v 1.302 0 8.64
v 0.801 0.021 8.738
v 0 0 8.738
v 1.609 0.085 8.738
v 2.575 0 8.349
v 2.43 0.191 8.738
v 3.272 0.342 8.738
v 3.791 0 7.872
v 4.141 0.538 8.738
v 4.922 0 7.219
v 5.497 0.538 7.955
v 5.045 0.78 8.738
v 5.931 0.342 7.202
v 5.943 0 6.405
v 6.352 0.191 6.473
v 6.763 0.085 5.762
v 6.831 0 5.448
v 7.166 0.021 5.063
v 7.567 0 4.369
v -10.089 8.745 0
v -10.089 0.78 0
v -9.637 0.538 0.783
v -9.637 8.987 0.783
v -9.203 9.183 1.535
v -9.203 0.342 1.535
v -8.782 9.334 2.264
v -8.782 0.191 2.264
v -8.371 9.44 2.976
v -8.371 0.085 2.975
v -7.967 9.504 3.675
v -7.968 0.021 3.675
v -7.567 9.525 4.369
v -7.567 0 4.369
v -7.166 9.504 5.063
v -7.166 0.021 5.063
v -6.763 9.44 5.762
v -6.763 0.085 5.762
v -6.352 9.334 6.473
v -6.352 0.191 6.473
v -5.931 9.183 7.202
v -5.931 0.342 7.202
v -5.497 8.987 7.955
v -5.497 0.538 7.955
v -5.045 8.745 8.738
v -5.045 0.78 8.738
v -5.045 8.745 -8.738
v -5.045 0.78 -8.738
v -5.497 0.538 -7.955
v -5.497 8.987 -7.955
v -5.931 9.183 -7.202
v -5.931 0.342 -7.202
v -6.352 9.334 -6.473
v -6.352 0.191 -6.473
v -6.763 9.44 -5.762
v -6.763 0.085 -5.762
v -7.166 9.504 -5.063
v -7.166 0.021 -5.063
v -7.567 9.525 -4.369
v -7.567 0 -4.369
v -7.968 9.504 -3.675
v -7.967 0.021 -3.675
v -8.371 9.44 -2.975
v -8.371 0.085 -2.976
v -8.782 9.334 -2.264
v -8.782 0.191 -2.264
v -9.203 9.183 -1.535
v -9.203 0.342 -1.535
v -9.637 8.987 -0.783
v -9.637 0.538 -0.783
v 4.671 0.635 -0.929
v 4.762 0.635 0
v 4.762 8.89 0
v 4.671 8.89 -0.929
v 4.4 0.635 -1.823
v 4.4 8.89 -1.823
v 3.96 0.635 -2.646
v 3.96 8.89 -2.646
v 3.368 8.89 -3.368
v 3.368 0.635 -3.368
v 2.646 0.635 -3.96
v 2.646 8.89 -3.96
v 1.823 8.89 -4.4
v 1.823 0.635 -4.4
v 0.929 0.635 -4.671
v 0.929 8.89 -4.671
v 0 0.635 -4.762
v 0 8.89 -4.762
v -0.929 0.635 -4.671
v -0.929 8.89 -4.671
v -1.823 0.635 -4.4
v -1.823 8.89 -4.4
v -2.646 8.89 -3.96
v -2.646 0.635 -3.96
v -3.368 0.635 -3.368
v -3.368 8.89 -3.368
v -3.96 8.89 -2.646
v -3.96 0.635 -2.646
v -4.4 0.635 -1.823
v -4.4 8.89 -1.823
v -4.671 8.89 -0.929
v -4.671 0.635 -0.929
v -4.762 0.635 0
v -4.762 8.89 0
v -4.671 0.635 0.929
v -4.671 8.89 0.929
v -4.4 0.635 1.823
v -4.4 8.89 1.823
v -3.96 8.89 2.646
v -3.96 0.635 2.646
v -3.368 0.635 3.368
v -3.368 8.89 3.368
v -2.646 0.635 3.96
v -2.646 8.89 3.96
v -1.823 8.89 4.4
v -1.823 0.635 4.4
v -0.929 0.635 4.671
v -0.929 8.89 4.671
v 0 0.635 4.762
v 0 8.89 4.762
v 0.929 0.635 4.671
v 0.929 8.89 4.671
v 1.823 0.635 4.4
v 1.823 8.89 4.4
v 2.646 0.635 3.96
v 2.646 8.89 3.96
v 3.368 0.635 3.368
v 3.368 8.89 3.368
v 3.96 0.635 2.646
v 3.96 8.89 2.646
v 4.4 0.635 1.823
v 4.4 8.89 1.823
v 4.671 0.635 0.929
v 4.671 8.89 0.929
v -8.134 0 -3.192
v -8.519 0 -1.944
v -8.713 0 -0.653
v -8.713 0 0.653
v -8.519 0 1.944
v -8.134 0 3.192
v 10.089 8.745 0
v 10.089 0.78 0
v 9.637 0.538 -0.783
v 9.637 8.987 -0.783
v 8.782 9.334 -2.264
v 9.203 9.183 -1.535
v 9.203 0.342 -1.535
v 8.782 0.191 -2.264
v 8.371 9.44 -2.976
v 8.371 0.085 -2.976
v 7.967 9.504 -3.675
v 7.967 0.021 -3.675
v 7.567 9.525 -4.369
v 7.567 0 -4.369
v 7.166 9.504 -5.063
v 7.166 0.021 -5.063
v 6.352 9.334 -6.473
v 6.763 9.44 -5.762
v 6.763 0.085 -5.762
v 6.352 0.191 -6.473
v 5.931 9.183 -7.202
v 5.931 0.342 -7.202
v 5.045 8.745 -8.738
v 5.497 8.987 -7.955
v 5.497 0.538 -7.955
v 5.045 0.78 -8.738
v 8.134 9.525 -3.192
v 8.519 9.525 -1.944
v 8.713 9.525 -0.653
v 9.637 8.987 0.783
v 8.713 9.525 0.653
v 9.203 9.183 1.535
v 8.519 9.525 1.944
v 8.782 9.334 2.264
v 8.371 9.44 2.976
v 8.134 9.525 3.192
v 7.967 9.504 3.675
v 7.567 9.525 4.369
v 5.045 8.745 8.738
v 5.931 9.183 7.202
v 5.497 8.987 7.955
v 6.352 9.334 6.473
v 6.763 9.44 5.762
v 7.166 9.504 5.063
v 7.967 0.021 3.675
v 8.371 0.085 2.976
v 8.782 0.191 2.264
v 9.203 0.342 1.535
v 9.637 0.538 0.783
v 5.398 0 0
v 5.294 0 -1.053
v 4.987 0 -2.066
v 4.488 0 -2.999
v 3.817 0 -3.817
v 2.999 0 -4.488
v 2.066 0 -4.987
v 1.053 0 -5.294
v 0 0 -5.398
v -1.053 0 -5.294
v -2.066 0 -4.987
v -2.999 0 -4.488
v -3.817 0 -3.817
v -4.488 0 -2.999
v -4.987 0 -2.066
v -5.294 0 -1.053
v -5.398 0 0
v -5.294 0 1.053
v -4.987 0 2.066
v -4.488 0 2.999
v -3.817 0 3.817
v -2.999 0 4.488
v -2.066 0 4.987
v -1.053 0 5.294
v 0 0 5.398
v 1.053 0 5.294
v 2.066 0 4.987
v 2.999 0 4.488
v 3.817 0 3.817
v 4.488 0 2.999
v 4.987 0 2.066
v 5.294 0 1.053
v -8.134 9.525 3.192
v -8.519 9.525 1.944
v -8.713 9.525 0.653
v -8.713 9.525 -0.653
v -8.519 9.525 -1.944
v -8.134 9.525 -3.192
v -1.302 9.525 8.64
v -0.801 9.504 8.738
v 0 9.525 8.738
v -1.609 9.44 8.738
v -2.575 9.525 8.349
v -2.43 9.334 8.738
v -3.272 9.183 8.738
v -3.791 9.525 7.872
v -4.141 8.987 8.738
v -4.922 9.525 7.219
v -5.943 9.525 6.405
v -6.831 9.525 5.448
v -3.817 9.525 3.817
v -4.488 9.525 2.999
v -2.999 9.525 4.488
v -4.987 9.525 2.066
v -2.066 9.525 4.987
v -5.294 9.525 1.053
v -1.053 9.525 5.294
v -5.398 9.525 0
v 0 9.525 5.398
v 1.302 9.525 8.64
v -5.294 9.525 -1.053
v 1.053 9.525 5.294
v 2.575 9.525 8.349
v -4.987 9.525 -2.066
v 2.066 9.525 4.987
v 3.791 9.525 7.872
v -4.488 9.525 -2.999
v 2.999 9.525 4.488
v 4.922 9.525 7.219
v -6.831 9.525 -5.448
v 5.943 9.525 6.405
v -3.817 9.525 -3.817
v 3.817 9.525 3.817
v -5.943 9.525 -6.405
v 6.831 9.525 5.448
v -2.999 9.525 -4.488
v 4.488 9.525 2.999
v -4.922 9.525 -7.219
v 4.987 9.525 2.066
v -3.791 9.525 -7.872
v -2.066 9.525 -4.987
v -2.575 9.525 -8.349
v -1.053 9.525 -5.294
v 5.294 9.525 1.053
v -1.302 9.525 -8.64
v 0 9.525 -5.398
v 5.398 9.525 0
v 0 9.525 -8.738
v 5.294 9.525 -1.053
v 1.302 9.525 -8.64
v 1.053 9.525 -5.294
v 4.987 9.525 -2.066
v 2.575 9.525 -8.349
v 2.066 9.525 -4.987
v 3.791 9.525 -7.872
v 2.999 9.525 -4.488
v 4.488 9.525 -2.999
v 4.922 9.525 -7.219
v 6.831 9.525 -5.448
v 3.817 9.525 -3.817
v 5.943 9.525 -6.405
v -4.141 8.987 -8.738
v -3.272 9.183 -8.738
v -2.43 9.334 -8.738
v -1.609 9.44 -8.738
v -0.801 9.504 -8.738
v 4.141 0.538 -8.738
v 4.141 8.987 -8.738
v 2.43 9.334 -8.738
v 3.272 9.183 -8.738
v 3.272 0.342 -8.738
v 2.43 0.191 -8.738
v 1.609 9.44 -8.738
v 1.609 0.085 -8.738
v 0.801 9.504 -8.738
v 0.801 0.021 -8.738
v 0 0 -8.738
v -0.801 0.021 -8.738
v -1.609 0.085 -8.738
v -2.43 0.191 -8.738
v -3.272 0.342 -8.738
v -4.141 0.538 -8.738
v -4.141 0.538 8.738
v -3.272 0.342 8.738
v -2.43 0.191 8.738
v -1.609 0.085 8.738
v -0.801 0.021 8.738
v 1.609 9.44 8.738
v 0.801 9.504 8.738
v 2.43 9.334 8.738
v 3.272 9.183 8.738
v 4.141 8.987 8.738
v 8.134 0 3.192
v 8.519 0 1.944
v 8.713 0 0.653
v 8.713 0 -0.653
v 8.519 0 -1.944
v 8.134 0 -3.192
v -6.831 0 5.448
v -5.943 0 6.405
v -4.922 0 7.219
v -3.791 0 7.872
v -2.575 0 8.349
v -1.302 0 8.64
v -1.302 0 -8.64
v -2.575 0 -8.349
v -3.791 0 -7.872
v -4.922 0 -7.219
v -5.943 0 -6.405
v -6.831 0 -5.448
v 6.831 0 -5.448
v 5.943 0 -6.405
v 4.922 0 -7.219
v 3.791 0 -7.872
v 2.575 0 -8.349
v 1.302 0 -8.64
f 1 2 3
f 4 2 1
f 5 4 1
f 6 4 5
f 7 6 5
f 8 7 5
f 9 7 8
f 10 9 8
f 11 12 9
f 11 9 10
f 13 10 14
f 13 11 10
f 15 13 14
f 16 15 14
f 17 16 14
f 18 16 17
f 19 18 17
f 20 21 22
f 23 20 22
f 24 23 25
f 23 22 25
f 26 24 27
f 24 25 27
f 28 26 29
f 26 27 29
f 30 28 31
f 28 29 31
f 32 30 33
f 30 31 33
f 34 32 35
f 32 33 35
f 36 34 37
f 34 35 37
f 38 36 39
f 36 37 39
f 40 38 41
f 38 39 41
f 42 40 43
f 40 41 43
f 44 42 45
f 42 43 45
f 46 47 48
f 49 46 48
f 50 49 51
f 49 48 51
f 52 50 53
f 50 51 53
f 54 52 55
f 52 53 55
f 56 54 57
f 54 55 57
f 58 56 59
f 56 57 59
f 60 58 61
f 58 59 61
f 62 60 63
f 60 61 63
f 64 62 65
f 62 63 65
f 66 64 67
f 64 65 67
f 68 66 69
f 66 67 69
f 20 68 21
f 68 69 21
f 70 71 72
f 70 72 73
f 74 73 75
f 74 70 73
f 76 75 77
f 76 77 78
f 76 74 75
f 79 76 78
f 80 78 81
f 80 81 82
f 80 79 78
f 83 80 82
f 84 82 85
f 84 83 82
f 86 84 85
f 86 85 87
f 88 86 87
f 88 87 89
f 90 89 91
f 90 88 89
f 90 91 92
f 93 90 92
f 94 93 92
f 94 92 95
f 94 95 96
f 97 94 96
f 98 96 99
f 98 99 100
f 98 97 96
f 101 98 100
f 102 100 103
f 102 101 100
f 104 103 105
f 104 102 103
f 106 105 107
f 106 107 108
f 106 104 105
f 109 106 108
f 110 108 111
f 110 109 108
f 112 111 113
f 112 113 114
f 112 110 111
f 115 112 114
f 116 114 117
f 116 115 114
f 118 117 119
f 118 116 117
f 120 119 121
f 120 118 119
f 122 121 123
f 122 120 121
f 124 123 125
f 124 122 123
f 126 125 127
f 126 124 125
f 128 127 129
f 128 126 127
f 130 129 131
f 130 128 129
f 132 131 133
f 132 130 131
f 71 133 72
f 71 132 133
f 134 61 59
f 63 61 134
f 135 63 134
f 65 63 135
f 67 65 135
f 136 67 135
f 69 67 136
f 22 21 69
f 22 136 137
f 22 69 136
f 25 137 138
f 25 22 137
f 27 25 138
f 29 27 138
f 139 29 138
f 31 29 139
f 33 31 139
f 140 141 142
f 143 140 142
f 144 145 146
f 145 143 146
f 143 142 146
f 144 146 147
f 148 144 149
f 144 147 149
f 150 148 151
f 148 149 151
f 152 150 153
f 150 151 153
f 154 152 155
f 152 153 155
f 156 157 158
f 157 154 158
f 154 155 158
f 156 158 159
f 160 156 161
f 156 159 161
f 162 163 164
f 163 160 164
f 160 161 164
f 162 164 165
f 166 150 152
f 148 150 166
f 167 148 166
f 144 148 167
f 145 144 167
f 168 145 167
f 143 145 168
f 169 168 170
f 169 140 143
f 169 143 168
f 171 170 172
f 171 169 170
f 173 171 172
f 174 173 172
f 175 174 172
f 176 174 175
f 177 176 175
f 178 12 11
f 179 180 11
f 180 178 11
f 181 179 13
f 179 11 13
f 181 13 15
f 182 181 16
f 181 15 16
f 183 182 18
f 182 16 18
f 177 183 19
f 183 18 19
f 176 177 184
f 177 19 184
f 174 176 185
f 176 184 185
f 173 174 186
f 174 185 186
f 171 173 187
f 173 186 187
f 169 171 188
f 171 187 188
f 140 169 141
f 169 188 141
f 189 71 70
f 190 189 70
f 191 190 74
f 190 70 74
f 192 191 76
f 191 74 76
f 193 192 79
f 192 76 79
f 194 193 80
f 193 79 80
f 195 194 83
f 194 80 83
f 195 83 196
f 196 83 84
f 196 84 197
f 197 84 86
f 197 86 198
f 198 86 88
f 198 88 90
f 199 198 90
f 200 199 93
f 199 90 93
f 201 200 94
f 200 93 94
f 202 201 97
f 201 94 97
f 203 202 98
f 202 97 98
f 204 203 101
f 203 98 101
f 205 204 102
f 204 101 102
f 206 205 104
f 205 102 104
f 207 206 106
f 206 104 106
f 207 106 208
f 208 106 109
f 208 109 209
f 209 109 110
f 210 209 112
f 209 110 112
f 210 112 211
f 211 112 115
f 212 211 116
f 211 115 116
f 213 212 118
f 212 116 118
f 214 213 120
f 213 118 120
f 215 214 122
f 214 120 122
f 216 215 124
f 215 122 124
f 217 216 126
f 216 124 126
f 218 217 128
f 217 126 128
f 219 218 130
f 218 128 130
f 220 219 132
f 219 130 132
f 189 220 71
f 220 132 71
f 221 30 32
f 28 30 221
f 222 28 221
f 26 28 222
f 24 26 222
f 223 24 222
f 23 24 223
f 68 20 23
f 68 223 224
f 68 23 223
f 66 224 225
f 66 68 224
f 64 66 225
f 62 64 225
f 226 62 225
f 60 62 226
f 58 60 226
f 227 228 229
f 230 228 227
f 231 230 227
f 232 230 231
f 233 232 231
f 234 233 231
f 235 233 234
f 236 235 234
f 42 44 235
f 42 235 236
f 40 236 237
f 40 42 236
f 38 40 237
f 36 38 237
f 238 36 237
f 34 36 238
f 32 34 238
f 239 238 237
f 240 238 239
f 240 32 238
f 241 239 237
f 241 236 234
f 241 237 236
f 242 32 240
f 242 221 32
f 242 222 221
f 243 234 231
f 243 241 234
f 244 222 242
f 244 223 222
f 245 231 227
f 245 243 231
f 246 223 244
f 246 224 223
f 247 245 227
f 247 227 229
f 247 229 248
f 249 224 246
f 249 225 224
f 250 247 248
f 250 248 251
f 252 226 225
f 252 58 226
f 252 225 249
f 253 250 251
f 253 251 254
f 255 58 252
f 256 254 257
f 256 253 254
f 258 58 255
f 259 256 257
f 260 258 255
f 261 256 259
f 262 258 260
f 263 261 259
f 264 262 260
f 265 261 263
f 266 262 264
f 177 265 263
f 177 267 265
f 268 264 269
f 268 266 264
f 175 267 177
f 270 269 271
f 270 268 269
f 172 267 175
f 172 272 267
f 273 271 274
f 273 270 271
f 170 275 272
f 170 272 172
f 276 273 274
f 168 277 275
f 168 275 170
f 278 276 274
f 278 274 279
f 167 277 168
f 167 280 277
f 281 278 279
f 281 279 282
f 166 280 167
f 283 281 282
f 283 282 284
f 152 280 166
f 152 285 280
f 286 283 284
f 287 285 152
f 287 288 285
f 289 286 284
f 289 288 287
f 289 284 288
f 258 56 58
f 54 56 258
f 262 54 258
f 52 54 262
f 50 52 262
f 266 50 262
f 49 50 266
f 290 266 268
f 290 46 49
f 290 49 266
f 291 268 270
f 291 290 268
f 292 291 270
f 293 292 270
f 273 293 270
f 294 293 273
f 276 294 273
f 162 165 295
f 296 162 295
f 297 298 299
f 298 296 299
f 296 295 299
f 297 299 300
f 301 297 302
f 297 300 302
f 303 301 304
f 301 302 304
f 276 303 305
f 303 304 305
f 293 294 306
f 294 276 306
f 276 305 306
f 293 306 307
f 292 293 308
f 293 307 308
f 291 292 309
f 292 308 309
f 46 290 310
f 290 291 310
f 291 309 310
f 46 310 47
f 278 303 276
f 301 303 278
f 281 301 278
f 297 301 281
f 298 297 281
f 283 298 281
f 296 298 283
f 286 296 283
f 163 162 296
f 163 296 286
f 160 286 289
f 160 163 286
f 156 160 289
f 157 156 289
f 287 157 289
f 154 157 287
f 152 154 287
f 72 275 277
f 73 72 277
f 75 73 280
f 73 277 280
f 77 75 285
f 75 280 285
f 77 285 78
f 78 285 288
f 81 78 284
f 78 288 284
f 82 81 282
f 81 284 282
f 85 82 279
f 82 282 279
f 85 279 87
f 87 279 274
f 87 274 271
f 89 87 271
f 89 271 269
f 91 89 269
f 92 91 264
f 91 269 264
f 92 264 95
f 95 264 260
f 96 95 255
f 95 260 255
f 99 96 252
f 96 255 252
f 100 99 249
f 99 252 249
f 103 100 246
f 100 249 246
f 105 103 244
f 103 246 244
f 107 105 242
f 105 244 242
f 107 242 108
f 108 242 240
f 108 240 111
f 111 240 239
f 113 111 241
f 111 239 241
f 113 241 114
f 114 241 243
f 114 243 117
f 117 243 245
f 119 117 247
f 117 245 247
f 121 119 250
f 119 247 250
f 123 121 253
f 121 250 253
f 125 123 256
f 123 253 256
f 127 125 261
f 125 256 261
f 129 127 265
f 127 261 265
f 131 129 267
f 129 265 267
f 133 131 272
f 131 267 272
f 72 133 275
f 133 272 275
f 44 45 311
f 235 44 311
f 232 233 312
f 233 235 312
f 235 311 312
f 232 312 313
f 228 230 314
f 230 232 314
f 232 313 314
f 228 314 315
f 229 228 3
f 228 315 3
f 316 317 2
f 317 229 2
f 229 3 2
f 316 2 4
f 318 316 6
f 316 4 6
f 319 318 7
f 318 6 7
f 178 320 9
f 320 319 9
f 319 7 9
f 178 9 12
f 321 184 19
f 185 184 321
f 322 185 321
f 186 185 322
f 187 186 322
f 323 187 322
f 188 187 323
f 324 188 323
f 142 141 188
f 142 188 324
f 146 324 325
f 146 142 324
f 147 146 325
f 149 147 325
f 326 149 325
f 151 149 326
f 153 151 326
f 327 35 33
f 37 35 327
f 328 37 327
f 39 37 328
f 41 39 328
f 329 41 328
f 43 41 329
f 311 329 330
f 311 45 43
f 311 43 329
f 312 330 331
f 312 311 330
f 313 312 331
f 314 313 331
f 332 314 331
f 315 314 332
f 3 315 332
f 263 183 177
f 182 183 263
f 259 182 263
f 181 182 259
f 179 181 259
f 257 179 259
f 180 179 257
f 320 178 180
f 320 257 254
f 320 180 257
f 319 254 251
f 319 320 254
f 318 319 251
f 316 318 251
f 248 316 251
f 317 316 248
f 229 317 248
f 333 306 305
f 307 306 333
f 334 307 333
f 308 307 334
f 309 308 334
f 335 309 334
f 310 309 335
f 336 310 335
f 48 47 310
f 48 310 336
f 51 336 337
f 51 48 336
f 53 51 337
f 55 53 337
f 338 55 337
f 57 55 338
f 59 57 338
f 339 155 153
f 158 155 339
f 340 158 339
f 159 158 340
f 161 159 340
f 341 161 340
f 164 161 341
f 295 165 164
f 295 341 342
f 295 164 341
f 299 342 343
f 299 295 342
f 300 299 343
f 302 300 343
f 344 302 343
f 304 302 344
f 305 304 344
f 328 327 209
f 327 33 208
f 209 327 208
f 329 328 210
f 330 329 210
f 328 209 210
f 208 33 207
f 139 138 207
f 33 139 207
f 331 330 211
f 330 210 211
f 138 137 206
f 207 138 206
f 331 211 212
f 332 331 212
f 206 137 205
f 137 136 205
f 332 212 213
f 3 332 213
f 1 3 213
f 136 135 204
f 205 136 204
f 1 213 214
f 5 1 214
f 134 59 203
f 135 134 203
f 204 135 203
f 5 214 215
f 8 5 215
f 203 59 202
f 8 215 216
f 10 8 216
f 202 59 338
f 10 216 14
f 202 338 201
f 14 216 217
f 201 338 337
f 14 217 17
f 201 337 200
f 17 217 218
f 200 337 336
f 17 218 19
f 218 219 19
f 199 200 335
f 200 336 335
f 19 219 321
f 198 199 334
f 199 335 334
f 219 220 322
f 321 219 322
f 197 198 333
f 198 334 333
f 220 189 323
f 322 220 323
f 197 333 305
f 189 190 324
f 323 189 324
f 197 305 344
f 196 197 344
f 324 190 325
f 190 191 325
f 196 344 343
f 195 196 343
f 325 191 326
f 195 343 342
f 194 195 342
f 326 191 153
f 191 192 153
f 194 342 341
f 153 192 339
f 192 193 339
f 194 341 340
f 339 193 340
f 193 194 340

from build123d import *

# Parameters (mm, degrees)
SKETCH1_R           = 4.7625
BOSS_EXTRUDE1_DEPTH = 9.525
SKETCH2_OUTSIDE_W   = 60.842
SKETCH2_OUTSIDE_H   = 58.14
SKETCH2_OUTSIDE_R   = 8.7376
CUT_EXTRUDE1_DEPTH  = 9.525
CUT_EXTRUDE1_TAPER  = 60
SKETCH3_OUTSIDE_W   = 60.842
SKETCH3_OUTSIDE_H   = 58.14
SKETCH3_OUTSIDE_R   = 8.7376
CUT_EXTRUDE2_DEPTH  = 9.525
CUT_EXTRUDE2_TAPER  = 60
CHAMFER1_SIZE       = 0.635


with BuildPart() as part:
    # Sketch1 → Boss-Extrude1 (new body)
    with BuildSketch(Plane(origin=(0, 0, 0), x_dir=(1, 0, 0), z_dir=(0, 1, 0))):
        Polygon((10.089311424, 0), (5.044655712, 8.7376), (-5.044655712, 8.7376), (-10.089311424, 0), (-5.044655712, -8.7376), (5.044655712, -8.7376), align=None)
        Circle(SKETCH1_R, mode=Mode.SUBTRACT)
    extrude(amount=BOSS_EXTRUDE1_DEPTH)

    # Sketch2 outside → Cut-Extrude1 (cut)
    with BuildSketch(Plane(origin=(0, 9.525, 0), x_dir=(1, 0, 0), z_dir=(0, 1, 0))):
        Rectangle(SKETCH2_OUTSIDE_W, SKETCH2_OUTSIDE_H)
        Circle(SKETCH2_OUTSIDE_R, mode=Mode.SUBTRACT)
    extrude(amount=-CUT_EXTRUDE1_DEPTH, taper=CUT_EXTRUDE1_TAPER, mode=Mode.SUBTRACT)

    # Sketch3 outside → Cut-Extrude2 (cut)
    with BuildSketch(Plane.XZ):
        Rectangle(SKETCH3_OUTSIDE_W, SKETCH3_OUTSIDE_H)
        Circle(SKETCH3_OUTSIDE_R, mode=Mode.SUBTRACT)
    extrude(amount=-CUT_EXTRUDE2_DEPTH, taper=CUT_EXTRUDE2_TAPER, mode=Mode.SUBTRACT)

    # Chamfer1
    chamfer1_edges = [part.edges().sort_by_distance(p)[0] for p in [
        (-4.7625, 0, 0),
        (-4.7625, 9.525, 0),
    ]]
    chamfer(chamfer1_edges, length=CHAMFER1_SIZE)


solid = part.part
